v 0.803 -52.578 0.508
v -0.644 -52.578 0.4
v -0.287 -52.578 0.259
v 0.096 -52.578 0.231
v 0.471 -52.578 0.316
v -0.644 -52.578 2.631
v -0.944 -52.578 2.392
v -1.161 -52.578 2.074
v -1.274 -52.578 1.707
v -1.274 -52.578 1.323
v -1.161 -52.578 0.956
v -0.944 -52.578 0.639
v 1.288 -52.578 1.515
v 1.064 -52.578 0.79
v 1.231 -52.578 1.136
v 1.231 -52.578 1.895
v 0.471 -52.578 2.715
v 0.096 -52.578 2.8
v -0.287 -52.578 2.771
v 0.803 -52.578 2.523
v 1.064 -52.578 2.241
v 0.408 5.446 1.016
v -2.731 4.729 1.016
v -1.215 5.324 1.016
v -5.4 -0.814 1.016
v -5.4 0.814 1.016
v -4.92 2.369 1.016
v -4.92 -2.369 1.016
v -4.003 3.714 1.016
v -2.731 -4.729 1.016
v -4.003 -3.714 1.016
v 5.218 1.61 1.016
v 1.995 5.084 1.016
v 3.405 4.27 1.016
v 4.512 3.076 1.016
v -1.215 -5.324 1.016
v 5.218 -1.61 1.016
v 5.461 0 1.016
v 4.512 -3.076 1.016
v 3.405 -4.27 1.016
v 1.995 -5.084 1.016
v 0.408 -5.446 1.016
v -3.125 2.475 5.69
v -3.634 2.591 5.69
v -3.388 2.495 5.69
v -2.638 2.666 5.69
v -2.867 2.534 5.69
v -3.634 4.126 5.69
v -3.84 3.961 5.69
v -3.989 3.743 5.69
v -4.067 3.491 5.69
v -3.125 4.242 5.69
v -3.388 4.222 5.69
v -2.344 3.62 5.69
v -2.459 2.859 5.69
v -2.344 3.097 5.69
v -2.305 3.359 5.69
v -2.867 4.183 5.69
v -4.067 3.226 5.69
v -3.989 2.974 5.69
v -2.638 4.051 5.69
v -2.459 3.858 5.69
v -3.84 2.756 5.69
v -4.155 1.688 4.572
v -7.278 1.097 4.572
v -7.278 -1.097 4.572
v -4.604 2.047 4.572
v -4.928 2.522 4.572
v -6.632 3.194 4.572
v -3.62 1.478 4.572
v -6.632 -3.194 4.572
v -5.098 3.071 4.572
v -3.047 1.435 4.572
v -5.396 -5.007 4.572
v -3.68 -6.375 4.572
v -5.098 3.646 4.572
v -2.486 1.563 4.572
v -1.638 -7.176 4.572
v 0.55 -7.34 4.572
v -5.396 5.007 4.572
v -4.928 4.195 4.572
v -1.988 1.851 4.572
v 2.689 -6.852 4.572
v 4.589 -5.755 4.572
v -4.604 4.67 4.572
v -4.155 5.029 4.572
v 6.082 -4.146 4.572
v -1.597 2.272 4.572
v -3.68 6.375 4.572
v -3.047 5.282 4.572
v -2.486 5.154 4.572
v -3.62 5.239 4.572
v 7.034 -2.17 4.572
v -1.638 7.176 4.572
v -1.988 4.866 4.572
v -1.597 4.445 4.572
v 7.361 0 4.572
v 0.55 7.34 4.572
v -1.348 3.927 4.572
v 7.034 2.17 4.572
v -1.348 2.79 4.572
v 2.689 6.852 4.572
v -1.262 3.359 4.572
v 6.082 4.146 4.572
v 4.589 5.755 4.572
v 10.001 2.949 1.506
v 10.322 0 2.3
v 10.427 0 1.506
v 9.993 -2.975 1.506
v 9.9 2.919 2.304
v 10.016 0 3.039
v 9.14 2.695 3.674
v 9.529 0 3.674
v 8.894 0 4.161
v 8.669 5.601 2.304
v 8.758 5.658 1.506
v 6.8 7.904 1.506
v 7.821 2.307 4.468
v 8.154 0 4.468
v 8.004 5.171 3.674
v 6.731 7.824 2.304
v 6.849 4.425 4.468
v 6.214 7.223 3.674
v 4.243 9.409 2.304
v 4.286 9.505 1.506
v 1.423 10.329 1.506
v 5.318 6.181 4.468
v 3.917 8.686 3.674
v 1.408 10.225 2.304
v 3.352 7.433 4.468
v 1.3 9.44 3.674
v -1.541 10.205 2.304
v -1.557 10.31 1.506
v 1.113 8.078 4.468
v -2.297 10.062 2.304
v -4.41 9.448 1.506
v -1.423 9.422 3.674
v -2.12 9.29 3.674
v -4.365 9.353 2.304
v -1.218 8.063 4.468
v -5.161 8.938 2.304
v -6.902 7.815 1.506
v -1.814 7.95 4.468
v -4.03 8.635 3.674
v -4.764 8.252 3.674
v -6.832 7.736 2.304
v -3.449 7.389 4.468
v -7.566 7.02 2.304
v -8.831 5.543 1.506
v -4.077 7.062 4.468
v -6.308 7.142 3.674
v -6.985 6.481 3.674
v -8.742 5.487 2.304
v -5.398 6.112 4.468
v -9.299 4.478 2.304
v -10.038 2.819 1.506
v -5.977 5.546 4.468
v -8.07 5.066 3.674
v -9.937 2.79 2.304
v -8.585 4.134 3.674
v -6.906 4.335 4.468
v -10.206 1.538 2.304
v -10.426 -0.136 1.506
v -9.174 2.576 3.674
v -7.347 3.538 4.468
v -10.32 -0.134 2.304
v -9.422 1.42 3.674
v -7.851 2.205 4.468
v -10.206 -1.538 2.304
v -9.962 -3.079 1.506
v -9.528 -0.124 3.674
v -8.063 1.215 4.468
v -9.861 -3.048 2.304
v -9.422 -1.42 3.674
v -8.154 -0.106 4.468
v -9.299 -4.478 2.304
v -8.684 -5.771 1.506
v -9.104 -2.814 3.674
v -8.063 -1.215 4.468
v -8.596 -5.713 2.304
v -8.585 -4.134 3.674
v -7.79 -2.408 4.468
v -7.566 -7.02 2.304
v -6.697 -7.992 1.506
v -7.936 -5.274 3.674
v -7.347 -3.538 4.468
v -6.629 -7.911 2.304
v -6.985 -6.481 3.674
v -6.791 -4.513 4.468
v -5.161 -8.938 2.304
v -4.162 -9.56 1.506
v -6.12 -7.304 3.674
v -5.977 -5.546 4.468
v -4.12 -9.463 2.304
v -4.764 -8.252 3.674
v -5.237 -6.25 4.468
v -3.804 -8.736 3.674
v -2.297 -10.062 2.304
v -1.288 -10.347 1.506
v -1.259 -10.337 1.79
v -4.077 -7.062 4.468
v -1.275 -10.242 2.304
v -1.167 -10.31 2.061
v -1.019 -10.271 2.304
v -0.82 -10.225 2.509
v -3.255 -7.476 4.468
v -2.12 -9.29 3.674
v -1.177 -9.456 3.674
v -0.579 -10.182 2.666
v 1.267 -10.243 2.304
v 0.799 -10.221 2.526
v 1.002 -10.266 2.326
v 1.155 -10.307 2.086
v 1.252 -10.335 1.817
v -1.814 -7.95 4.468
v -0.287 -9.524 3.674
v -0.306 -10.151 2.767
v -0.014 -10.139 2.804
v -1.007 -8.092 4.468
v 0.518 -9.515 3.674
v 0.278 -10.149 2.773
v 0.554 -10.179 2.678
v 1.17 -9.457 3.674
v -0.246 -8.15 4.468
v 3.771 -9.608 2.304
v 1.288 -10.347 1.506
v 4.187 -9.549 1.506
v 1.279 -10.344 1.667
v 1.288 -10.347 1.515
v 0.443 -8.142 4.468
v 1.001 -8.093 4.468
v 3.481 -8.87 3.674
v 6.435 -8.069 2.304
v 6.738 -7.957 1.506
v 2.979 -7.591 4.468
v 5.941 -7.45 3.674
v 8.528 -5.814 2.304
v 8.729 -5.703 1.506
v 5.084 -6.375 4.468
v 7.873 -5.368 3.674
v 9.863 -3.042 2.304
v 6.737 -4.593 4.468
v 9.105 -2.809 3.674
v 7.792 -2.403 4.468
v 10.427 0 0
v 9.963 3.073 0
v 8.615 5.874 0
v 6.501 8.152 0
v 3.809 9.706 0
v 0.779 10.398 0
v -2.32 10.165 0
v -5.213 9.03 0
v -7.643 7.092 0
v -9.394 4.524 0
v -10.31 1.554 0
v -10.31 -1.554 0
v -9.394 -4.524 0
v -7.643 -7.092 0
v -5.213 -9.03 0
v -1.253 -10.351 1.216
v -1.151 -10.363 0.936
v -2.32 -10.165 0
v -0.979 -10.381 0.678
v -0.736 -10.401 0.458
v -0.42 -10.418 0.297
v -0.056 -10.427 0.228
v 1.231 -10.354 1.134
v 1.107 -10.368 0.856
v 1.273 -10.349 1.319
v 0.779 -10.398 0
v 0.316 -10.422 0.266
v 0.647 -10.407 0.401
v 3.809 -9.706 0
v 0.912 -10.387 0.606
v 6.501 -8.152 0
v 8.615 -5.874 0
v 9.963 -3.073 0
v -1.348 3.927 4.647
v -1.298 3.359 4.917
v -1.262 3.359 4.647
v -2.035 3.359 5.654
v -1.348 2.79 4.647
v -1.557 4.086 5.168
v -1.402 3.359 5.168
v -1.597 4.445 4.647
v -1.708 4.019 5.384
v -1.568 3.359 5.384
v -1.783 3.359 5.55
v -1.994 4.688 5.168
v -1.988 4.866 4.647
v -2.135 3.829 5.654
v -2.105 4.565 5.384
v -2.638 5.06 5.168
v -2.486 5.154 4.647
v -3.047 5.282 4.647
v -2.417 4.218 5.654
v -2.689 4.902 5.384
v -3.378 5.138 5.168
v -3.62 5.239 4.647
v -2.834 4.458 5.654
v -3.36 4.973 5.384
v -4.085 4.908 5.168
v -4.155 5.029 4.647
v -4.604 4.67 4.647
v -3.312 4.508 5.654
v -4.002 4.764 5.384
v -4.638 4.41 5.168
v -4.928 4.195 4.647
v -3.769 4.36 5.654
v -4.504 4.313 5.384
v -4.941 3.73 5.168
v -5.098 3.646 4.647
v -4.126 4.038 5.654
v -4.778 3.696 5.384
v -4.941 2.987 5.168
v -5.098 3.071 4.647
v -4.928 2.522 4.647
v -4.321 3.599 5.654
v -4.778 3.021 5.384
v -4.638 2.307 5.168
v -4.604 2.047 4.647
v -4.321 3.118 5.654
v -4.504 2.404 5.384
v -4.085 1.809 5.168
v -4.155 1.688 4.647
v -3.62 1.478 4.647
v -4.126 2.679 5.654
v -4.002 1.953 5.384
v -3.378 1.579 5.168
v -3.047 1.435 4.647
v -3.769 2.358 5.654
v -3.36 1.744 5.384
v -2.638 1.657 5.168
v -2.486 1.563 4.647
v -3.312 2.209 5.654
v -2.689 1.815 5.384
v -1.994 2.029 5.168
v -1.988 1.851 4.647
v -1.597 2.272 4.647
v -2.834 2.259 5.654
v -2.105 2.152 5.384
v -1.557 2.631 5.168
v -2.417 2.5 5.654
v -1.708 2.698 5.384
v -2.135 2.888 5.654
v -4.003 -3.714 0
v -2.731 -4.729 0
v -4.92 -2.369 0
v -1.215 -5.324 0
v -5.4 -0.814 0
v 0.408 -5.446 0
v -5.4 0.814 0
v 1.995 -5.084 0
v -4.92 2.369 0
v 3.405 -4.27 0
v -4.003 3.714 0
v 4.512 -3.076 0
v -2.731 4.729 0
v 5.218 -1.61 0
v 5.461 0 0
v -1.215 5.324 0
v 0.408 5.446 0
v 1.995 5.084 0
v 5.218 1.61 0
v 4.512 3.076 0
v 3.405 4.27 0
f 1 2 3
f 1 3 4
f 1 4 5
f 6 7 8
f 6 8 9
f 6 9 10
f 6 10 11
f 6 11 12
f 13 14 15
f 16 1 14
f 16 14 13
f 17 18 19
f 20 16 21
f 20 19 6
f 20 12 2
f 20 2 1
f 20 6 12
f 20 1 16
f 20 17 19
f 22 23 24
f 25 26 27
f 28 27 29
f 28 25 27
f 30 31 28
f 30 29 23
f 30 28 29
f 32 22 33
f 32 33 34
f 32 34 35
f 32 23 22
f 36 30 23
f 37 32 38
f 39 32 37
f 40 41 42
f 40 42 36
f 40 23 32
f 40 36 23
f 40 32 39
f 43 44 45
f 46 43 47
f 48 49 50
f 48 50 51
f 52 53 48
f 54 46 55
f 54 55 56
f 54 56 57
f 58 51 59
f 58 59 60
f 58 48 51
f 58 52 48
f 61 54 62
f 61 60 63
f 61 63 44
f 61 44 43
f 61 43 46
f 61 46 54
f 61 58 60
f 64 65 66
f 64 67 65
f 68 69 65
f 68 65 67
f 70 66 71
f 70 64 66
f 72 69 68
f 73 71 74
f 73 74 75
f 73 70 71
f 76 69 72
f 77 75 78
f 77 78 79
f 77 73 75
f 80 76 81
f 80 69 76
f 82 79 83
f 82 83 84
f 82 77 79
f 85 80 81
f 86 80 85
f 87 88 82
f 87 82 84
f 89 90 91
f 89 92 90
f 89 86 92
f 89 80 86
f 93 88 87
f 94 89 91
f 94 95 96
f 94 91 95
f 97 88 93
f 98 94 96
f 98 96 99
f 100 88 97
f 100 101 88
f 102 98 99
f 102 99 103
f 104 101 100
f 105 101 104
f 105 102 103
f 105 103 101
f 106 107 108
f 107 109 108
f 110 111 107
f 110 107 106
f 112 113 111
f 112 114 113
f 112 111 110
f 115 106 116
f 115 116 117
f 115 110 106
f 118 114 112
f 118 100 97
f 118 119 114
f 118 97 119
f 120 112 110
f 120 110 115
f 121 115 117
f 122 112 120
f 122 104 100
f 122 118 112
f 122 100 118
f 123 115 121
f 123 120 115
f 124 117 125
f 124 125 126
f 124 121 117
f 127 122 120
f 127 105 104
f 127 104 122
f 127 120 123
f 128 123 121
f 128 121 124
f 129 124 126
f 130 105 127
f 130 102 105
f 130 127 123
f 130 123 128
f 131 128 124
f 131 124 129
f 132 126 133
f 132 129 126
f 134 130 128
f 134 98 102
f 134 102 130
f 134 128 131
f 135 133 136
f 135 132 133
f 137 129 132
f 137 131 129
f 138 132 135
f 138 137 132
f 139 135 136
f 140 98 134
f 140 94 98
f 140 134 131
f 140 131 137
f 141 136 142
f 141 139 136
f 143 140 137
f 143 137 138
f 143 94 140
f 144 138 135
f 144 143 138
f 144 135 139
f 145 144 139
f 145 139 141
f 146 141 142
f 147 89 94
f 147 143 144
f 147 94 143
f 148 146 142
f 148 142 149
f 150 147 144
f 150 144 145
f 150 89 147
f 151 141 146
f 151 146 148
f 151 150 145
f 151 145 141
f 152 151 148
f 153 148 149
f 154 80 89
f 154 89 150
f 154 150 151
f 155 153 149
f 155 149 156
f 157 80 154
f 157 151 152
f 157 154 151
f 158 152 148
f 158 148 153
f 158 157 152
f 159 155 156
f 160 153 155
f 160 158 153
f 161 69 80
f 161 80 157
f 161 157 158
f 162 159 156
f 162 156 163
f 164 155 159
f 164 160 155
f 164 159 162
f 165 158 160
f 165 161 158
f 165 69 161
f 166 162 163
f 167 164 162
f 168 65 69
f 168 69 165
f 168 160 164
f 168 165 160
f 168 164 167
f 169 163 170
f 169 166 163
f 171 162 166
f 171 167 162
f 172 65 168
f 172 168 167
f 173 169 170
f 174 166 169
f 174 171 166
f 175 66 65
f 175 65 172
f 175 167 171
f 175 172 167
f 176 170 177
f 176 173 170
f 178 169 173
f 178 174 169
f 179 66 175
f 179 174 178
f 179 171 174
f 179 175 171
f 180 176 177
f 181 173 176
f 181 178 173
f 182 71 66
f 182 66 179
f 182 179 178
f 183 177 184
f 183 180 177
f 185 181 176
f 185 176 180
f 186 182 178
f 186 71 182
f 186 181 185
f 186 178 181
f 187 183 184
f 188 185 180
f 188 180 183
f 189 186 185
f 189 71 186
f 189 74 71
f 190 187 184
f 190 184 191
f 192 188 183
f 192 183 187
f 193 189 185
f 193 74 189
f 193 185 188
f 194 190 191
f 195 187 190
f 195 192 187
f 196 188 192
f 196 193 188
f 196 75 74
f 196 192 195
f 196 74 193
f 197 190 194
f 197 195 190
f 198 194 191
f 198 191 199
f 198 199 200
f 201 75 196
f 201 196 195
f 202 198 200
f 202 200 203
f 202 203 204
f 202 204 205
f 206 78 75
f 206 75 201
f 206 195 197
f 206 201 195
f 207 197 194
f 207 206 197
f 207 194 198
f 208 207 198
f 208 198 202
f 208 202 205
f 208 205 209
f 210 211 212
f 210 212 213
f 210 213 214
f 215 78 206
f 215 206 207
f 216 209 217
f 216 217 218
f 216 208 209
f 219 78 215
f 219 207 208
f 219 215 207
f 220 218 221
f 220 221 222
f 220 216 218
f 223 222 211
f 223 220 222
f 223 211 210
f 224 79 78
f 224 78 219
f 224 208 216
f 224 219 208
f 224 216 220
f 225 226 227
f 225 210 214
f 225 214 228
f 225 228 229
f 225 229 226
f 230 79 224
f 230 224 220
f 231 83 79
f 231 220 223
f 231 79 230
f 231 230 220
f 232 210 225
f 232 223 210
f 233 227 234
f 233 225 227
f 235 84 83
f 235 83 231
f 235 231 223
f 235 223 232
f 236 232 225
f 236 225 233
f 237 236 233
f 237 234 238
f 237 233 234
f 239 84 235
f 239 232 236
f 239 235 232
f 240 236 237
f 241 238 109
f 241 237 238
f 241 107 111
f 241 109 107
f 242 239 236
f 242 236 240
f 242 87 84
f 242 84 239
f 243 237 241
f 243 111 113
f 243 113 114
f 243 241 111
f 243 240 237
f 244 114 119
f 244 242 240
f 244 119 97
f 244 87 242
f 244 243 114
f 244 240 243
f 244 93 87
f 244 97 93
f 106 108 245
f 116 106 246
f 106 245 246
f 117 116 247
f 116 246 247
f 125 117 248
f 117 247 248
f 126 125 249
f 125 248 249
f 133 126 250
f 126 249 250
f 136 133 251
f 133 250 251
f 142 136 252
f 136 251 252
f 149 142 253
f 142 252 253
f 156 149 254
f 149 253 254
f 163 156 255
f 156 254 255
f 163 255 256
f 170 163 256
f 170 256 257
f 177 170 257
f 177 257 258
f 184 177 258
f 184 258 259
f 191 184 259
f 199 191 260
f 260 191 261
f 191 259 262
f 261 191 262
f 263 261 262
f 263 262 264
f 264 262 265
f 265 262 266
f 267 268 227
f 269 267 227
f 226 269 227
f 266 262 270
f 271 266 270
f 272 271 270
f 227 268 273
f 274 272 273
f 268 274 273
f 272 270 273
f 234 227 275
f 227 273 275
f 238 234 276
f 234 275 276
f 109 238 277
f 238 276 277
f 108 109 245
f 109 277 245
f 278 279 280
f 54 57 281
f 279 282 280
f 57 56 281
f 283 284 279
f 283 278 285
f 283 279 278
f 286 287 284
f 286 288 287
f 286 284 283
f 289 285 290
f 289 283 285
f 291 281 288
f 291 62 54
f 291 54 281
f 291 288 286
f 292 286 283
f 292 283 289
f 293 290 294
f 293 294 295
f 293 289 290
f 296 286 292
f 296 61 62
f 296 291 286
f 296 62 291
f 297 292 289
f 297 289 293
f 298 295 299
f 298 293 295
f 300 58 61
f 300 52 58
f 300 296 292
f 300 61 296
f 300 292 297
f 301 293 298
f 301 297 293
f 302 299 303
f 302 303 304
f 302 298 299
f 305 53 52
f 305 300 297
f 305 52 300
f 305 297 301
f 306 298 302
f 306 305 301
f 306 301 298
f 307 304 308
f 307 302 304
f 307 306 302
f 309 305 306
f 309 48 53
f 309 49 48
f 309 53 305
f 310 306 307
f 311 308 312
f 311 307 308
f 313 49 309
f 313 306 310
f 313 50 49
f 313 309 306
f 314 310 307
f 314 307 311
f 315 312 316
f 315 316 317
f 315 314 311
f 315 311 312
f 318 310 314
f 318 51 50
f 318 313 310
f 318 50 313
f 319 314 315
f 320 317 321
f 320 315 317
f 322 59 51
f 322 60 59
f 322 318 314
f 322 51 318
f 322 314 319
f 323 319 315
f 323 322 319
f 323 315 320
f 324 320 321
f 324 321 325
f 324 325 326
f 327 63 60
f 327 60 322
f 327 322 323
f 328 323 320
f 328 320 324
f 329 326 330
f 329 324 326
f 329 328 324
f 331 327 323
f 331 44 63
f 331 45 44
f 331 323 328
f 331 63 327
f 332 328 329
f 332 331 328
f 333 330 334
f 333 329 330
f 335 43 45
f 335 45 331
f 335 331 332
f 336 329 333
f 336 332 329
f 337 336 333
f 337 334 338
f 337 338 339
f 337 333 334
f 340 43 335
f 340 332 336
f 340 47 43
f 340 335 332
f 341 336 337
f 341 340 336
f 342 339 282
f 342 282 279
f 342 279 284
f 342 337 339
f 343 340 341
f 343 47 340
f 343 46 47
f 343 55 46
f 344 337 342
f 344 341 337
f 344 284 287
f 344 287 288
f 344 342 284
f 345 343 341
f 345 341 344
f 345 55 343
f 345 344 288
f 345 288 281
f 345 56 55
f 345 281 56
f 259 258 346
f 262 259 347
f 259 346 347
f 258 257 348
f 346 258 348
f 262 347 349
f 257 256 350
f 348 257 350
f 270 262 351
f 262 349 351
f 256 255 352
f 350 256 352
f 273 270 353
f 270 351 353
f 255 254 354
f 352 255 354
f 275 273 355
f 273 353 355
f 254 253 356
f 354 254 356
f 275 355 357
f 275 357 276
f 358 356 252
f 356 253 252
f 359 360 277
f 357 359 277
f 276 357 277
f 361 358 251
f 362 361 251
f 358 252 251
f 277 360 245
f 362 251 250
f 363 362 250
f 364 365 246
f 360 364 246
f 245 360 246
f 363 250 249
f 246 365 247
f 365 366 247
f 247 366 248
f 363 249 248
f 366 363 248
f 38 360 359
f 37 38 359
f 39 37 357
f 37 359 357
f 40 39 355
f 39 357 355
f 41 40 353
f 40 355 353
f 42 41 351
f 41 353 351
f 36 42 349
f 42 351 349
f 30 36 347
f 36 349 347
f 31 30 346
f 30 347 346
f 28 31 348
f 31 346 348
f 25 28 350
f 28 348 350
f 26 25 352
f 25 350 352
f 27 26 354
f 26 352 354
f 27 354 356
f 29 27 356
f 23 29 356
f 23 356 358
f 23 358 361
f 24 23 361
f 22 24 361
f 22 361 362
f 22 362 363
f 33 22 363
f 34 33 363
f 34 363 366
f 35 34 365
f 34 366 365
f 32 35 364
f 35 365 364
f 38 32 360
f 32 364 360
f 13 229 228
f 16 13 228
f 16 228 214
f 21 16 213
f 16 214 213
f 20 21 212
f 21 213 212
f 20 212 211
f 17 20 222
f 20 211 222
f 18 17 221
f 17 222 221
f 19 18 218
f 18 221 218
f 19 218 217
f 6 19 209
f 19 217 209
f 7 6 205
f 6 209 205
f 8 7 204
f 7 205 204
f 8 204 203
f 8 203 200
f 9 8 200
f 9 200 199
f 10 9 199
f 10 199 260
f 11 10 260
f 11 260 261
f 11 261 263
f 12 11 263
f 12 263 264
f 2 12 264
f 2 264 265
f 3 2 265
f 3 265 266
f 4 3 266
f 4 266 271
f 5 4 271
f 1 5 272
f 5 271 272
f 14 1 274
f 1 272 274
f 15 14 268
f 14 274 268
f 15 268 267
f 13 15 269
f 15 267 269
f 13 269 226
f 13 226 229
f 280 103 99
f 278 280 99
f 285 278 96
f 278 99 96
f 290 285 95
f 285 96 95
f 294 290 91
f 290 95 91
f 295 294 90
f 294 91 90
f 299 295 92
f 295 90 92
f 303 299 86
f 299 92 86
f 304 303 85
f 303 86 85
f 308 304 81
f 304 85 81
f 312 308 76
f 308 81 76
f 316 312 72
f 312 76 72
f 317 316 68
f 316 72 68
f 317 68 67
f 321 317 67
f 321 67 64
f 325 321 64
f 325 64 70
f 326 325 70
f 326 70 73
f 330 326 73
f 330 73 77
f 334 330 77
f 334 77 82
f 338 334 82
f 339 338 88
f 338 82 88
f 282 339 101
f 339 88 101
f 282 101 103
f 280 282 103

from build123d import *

# Parameters (mm, degrees)
F0_R     = 10.4267
F1_DEPTH = 4.572
F2_R     = 3.066051
F3_R     = 1.288306
F4_DEPTH = 52.578
F5_R     = 1.928538
F6_DEPTH = 1.1176
F7_R     = 1.042457
F8_R     = 5.461
F9_DEPTH = 1.016


with BuildPart() as f1:
    # F0 (on Top) → F1 (new body)
    with BuildSketch(Plane.XY):
        Circle(F0_R)
    extrude(amount=F1_DEPTH)

    # F2
    f2_edges = [f1.edges().sort_by_distance(p)[0] for p in [
        (-10.4267, 0, 4.572),
    ]]
    fillet(f2_edges, radius=F2_R)

    # F3 (on Front) → F4 (join)
    with BuildSketch(Plane.XZ):
        with Locations((0, 1.515293)):
            Circle(F3_R)
    extrude(amount=F4_DEPTH)

    # F5 (on face) → F6 (join)
    with BuildSketch(Plane.XY.offset(4.572)):
        with Locations((-3.190748, 3.358531)):
            Circle(F5_R)
    extrude(amount=F6_DEPTH)

    # F7
    f7_edges = [f1.edges().sort_by_distance(p)[0] for p in [
        (-5.119286, 3.358531, 5.6896),
    ]]
    fillet(f7_edges, radius=F7_R)

    # F8 (on face) → F9 (cut)
    with BuildSketch(Plane(origin=(0, 0, 0), x_dir=(1, 0, 0), z_dir=(0, 0, -1))):
        Circle(F8_R)
    extrude(amount=-F9_DEPTH, mode=Mode.SUBTRACT)


solid = f1.part
